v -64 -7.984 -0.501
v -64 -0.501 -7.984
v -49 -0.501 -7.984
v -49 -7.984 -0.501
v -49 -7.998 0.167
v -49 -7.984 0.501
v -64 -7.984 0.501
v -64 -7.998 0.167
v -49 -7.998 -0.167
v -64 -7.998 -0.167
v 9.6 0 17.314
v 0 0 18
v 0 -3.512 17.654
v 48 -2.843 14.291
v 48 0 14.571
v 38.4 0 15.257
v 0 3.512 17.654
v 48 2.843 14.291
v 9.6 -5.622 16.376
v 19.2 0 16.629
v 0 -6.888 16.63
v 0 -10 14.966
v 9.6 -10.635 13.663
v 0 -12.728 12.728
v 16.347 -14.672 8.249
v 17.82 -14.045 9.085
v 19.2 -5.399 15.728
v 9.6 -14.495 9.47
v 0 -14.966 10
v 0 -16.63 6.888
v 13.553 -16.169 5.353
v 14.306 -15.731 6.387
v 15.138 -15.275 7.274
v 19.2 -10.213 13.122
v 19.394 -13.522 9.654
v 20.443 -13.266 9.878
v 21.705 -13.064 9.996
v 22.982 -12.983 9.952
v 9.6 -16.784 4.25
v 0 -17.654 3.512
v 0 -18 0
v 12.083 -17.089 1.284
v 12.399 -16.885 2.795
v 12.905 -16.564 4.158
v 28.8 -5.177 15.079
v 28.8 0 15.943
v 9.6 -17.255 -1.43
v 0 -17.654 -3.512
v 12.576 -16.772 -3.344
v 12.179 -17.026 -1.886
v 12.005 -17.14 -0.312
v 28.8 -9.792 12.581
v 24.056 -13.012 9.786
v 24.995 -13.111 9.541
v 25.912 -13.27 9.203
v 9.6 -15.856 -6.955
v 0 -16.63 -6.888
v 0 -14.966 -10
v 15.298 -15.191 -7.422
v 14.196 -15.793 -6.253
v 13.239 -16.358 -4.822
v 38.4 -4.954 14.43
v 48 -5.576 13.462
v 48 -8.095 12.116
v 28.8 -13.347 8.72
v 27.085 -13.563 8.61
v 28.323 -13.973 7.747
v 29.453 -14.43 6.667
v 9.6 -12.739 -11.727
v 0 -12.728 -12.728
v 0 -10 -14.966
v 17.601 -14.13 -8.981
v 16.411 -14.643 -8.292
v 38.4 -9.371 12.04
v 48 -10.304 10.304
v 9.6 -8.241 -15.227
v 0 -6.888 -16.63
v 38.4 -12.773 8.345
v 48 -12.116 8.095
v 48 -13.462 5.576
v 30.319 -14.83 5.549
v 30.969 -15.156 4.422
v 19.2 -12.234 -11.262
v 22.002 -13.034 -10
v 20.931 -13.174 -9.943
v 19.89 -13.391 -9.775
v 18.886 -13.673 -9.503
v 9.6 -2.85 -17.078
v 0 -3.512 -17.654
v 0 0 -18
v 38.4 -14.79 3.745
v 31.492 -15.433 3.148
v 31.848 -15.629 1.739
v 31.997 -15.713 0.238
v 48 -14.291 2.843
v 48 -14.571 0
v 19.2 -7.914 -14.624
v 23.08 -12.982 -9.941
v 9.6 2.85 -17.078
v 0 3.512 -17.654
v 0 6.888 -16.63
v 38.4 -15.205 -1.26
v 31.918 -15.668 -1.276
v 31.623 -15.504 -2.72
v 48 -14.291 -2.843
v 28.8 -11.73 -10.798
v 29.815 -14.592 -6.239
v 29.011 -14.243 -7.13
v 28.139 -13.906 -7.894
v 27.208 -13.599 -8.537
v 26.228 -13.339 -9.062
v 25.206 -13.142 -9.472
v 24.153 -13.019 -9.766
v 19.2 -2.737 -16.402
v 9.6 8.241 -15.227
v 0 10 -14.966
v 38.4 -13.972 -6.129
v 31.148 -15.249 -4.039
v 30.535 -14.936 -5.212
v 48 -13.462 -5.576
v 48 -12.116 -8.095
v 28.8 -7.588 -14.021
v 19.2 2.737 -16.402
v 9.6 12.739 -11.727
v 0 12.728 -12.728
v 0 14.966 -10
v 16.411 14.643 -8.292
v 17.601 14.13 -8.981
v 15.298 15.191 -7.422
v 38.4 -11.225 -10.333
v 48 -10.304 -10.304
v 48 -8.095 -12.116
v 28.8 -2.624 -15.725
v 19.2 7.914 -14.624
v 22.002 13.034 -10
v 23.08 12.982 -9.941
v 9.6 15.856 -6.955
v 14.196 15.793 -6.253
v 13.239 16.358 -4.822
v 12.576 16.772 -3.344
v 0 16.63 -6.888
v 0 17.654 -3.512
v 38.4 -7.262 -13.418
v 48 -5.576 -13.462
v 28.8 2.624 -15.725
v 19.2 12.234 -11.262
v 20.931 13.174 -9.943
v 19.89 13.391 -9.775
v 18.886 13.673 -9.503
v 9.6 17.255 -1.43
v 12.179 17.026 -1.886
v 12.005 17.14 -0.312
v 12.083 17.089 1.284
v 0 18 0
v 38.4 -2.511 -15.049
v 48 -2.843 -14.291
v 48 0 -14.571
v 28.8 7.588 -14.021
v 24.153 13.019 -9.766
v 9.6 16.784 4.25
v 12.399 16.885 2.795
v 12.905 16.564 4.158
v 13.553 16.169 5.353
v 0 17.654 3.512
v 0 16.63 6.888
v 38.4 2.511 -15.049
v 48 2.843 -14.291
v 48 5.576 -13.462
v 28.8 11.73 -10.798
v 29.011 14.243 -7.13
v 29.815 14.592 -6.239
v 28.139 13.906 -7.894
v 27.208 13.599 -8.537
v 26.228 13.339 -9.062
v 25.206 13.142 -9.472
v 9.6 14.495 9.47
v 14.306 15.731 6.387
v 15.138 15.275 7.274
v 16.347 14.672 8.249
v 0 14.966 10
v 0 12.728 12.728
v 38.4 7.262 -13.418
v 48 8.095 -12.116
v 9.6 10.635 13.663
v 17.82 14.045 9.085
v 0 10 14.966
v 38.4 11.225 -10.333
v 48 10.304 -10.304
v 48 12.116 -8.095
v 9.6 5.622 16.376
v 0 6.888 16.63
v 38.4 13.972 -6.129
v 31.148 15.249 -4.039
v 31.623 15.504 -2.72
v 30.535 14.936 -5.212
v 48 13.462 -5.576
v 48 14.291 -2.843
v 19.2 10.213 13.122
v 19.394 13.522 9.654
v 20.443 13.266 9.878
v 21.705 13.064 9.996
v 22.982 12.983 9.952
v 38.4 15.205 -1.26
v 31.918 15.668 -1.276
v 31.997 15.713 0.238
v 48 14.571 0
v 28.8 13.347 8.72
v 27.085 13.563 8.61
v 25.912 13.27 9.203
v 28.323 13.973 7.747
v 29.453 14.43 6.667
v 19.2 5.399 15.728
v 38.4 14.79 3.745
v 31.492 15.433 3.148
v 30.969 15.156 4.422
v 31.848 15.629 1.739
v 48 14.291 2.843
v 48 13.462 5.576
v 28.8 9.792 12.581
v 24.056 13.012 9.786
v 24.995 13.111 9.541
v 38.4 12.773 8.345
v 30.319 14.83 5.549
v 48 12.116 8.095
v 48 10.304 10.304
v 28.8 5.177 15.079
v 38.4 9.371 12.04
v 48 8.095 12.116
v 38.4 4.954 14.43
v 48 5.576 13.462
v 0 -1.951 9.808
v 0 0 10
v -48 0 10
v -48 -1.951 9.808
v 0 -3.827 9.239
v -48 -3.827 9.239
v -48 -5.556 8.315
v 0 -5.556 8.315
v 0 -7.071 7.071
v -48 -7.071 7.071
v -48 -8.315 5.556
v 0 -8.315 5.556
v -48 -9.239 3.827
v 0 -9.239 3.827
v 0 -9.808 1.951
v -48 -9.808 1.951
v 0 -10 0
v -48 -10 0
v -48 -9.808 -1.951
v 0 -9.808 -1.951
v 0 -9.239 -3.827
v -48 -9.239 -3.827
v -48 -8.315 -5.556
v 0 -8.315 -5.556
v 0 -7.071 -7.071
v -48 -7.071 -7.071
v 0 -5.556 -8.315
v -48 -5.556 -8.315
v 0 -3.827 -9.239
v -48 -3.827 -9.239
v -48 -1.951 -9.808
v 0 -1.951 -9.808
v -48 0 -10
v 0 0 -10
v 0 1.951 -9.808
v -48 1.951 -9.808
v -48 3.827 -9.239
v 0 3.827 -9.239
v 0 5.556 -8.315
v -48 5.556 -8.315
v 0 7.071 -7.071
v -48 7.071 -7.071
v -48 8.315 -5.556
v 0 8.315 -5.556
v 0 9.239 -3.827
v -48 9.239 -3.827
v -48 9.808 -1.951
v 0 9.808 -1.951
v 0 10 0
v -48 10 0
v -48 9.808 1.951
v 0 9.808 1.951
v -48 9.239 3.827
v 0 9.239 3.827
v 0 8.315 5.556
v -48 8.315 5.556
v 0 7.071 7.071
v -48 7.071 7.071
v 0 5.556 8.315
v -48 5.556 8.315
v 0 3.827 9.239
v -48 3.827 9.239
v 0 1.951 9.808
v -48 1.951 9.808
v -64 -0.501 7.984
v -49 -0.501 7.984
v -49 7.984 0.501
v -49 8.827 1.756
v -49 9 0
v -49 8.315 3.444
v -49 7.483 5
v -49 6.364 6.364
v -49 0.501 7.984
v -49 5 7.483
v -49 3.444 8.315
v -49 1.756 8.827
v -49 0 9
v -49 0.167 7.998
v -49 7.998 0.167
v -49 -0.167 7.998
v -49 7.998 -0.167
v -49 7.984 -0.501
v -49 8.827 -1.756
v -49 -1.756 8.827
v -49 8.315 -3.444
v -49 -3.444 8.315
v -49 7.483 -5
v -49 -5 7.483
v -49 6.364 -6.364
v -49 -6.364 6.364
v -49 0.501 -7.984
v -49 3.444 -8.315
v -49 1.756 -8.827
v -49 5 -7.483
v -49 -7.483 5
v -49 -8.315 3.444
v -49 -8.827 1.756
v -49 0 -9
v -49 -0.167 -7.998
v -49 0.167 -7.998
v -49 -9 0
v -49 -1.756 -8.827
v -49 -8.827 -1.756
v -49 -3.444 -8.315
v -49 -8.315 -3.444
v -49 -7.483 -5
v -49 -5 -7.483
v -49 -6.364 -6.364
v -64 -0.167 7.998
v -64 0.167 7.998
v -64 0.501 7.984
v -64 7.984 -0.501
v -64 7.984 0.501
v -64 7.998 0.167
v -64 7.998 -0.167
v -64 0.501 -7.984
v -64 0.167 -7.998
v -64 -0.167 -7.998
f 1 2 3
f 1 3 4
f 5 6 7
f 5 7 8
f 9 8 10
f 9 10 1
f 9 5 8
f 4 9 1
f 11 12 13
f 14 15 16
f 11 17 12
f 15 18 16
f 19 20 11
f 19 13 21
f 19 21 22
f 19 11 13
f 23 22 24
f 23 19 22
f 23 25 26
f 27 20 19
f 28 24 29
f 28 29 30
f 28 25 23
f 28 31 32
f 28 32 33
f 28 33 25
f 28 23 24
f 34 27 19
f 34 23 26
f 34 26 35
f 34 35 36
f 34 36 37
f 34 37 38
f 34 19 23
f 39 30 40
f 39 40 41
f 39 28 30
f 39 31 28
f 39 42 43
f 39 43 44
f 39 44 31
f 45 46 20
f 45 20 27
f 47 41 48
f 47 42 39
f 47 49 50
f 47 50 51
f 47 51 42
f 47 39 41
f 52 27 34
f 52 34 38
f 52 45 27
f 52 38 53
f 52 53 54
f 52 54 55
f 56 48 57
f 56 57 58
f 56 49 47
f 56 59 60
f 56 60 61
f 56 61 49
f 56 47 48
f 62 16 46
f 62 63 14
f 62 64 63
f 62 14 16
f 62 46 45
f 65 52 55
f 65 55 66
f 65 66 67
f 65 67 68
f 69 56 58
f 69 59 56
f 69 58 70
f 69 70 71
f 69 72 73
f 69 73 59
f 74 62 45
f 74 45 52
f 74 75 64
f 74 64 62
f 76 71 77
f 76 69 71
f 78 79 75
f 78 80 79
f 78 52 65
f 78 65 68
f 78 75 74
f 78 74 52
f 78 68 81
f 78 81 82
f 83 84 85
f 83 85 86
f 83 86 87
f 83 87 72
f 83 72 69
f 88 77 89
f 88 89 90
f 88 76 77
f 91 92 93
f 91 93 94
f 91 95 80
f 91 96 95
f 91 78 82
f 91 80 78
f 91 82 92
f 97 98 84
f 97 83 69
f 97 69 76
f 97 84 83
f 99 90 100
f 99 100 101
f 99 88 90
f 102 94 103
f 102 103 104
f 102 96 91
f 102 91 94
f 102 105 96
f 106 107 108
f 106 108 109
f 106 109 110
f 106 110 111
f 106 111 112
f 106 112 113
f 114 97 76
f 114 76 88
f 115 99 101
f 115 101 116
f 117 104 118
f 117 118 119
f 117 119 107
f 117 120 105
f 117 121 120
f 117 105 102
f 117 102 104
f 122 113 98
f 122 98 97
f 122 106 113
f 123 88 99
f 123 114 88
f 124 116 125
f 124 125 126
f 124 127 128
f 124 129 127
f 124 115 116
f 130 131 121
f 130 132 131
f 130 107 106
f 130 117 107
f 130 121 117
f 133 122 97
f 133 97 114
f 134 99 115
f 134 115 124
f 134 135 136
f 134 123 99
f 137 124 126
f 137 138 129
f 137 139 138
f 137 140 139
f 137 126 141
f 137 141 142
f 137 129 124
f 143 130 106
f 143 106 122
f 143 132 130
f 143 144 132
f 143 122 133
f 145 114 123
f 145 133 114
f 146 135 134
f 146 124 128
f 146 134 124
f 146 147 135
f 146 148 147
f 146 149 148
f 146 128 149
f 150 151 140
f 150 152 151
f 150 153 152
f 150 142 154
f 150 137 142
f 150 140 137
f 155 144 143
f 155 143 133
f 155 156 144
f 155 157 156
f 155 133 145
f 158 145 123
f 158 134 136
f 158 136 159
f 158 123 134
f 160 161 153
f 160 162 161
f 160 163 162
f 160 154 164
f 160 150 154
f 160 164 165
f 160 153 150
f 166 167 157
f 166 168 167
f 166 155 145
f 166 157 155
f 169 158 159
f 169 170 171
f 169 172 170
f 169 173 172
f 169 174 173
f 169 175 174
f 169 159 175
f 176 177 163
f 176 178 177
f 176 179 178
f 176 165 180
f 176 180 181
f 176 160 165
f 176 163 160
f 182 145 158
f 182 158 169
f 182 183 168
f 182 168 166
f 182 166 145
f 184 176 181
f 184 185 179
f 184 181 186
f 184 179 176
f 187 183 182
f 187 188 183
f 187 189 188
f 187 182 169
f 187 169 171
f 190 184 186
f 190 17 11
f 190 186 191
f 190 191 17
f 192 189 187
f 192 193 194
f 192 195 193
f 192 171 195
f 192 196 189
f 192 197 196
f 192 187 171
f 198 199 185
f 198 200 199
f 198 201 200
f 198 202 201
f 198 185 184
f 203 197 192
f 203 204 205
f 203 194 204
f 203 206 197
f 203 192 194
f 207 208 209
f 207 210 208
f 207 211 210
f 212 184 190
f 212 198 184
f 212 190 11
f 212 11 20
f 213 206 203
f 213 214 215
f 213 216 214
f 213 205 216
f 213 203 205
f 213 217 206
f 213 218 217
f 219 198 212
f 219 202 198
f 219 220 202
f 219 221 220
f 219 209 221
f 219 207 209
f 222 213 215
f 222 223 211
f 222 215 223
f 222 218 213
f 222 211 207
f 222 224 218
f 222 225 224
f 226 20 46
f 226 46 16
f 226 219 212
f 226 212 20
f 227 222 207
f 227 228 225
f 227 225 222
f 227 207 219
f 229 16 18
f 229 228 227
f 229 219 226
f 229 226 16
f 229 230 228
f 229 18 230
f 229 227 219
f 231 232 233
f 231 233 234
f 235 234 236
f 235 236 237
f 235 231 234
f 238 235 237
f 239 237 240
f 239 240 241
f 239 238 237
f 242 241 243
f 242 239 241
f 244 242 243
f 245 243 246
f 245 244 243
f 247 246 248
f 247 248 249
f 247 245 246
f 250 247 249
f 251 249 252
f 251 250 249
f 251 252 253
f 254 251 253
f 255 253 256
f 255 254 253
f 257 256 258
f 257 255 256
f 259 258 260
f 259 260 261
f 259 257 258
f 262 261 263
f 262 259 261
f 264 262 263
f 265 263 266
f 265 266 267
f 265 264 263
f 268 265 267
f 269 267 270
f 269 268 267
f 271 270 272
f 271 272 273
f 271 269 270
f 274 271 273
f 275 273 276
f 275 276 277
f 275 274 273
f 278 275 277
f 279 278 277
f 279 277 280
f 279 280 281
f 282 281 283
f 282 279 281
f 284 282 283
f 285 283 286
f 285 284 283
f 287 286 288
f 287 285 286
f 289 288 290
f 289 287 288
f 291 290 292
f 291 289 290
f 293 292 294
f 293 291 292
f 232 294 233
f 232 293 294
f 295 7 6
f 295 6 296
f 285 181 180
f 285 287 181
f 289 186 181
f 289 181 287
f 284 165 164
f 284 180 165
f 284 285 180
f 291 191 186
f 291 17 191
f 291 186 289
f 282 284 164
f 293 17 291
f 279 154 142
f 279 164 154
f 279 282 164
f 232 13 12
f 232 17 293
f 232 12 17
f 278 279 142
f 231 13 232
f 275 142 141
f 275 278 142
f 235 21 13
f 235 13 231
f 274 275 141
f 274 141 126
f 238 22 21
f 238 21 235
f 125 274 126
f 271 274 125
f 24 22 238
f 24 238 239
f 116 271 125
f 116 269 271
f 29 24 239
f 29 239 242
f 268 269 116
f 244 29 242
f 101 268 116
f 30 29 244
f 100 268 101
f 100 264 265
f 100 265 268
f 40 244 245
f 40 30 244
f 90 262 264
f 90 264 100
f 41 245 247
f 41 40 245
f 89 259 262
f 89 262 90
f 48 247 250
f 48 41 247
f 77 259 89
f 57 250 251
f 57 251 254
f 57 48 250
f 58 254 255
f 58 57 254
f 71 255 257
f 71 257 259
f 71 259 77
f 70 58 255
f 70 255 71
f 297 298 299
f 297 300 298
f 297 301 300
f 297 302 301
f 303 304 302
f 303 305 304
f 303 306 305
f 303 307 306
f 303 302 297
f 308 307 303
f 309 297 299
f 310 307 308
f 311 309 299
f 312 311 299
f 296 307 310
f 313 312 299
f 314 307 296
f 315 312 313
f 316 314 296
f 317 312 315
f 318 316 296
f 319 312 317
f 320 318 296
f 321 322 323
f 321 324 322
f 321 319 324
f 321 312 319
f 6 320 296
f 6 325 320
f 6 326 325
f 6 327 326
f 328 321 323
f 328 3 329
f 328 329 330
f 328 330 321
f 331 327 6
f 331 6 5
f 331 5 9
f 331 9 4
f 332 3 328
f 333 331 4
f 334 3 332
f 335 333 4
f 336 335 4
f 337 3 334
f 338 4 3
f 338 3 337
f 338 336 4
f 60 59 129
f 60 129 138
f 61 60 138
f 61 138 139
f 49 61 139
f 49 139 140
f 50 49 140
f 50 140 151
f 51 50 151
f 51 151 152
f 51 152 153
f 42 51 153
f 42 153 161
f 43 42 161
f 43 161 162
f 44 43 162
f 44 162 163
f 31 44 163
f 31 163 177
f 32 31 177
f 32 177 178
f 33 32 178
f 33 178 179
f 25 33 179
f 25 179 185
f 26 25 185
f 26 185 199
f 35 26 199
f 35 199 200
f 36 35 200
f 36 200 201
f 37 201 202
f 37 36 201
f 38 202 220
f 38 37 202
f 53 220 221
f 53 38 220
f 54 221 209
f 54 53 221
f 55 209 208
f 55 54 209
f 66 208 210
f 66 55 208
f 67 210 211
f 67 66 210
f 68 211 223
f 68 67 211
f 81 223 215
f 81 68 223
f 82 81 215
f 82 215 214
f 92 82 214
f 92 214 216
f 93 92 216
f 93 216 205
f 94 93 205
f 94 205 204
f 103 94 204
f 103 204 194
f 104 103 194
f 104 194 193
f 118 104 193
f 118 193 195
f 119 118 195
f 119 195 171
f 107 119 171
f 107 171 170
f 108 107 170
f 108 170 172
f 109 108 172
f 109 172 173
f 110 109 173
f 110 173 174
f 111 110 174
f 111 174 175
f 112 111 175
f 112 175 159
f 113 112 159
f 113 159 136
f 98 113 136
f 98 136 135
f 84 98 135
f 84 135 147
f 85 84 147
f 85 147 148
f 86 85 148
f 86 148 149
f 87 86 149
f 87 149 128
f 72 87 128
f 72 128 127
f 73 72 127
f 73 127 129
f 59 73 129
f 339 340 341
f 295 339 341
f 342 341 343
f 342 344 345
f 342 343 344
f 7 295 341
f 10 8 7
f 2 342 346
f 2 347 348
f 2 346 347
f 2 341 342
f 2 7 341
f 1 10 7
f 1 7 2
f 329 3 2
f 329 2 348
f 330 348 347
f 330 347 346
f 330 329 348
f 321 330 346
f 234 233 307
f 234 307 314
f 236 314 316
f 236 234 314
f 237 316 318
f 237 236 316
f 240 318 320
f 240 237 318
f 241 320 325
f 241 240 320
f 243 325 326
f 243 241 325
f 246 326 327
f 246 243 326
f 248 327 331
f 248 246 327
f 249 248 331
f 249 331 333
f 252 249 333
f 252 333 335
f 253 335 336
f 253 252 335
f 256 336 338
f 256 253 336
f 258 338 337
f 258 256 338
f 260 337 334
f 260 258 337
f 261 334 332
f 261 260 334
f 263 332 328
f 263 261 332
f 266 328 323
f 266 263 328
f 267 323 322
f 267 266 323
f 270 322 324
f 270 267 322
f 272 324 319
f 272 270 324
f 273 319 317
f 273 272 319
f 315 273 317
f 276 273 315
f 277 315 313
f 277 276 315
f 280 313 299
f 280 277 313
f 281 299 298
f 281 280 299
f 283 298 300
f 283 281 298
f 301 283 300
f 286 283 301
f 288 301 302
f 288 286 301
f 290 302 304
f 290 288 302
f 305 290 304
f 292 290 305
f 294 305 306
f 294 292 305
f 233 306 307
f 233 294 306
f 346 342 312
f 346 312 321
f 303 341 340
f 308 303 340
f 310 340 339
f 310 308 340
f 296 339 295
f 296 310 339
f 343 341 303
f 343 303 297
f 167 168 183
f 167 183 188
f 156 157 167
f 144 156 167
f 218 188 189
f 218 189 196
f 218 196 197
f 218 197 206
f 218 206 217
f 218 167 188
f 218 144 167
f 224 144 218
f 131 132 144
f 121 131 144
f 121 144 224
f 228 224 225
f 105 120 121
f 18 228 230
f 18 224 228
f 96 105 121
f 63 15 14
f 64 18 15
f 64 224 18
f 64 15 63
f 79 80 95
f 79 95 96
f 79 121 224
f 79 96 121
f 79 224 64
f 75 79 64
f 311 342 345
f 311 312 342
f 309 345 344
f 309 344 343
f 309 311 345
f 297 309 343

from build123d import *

# Parameters (mm, degrees)
CUT_EXTRUDE_1_DEPTH      = 69.876701431
CUT_EXTRUDE_1_DEPTH_BACK = 69.876701431
SKETCH_2_R               = 10
SKETCH_3_OUTSIDE_W       = 62.606
SKETCH_3_OUTSIDE_H       = 62.606
CUT_EXTRUDE_2_DEPTH      = 15
CHAMFER_1_SIZE           = 1


with BuildPart() as part:
    # 草图1 → 旋转1 (revolve)
    with BuildSketch(Plane.XY, mode=Mode.PRIVATE) as revolve_1_sk:
        Polygon((-64, 0), (-64, 8), (-49, 8), (-49, 10), (0, 10), (0, 18), (48, 14.571428571), (48, 0), align=None)
    revolve(revolve_1_sk.sketch.rotate(Axis((-69.993580533, 0, 0), (1, 0, 0)), 90), axis=Axis((-69.993580533, 0, 0), (1, 0, 0)))

    # 草图2 → 拉伸1 (cut, two sides: drawn at the far end of the back side and taken through both)
    with BuildSketch(Plane(origin=(0, 0, 0), x_dir=(1, 0, 0), z_dir=(0, 1, 0)).offset(-CUT_EXTRUDE_1_DEPTH_BACK)):
        with Locations(Location((22, 0, 0), (0, 0, 132.082422816))):
            Circle(SKETCH_2_R)
    extrude(amount=CUT_EXTRUDE_1_DEPTH + CUT_EXTRUDE_1_DEPTH_BACK, mode=Mode.SUBTRACT)

    # 草图3 outside → 拉伸2 (cut)
    with BuildSketch(Plane.ZY.offset(64)):
        Rectangle(SKETCH_3_OUTSIDE_W, SKETCH_3_OUTSIDE_H)
        Polygon((-8.485281374, 0), (0, -8.485281374), (8.485281374, 0), (0, 8.485281374), align=None, mode=Mode.SUBTRACT)
    extrude(amount=-CUT_EXTRUDE_2_DEPTH, mode=Mode.SUBTRACT)

    # 倒角1
    chamfer_1_edges = [part.edges().sort_by_distance(p)[0] for p in [
        (-49, 0, -10),
    ]]
    chamfer(chamfer_1_edges, length=CHAMFER_1_SIZE)


solid = part.part
